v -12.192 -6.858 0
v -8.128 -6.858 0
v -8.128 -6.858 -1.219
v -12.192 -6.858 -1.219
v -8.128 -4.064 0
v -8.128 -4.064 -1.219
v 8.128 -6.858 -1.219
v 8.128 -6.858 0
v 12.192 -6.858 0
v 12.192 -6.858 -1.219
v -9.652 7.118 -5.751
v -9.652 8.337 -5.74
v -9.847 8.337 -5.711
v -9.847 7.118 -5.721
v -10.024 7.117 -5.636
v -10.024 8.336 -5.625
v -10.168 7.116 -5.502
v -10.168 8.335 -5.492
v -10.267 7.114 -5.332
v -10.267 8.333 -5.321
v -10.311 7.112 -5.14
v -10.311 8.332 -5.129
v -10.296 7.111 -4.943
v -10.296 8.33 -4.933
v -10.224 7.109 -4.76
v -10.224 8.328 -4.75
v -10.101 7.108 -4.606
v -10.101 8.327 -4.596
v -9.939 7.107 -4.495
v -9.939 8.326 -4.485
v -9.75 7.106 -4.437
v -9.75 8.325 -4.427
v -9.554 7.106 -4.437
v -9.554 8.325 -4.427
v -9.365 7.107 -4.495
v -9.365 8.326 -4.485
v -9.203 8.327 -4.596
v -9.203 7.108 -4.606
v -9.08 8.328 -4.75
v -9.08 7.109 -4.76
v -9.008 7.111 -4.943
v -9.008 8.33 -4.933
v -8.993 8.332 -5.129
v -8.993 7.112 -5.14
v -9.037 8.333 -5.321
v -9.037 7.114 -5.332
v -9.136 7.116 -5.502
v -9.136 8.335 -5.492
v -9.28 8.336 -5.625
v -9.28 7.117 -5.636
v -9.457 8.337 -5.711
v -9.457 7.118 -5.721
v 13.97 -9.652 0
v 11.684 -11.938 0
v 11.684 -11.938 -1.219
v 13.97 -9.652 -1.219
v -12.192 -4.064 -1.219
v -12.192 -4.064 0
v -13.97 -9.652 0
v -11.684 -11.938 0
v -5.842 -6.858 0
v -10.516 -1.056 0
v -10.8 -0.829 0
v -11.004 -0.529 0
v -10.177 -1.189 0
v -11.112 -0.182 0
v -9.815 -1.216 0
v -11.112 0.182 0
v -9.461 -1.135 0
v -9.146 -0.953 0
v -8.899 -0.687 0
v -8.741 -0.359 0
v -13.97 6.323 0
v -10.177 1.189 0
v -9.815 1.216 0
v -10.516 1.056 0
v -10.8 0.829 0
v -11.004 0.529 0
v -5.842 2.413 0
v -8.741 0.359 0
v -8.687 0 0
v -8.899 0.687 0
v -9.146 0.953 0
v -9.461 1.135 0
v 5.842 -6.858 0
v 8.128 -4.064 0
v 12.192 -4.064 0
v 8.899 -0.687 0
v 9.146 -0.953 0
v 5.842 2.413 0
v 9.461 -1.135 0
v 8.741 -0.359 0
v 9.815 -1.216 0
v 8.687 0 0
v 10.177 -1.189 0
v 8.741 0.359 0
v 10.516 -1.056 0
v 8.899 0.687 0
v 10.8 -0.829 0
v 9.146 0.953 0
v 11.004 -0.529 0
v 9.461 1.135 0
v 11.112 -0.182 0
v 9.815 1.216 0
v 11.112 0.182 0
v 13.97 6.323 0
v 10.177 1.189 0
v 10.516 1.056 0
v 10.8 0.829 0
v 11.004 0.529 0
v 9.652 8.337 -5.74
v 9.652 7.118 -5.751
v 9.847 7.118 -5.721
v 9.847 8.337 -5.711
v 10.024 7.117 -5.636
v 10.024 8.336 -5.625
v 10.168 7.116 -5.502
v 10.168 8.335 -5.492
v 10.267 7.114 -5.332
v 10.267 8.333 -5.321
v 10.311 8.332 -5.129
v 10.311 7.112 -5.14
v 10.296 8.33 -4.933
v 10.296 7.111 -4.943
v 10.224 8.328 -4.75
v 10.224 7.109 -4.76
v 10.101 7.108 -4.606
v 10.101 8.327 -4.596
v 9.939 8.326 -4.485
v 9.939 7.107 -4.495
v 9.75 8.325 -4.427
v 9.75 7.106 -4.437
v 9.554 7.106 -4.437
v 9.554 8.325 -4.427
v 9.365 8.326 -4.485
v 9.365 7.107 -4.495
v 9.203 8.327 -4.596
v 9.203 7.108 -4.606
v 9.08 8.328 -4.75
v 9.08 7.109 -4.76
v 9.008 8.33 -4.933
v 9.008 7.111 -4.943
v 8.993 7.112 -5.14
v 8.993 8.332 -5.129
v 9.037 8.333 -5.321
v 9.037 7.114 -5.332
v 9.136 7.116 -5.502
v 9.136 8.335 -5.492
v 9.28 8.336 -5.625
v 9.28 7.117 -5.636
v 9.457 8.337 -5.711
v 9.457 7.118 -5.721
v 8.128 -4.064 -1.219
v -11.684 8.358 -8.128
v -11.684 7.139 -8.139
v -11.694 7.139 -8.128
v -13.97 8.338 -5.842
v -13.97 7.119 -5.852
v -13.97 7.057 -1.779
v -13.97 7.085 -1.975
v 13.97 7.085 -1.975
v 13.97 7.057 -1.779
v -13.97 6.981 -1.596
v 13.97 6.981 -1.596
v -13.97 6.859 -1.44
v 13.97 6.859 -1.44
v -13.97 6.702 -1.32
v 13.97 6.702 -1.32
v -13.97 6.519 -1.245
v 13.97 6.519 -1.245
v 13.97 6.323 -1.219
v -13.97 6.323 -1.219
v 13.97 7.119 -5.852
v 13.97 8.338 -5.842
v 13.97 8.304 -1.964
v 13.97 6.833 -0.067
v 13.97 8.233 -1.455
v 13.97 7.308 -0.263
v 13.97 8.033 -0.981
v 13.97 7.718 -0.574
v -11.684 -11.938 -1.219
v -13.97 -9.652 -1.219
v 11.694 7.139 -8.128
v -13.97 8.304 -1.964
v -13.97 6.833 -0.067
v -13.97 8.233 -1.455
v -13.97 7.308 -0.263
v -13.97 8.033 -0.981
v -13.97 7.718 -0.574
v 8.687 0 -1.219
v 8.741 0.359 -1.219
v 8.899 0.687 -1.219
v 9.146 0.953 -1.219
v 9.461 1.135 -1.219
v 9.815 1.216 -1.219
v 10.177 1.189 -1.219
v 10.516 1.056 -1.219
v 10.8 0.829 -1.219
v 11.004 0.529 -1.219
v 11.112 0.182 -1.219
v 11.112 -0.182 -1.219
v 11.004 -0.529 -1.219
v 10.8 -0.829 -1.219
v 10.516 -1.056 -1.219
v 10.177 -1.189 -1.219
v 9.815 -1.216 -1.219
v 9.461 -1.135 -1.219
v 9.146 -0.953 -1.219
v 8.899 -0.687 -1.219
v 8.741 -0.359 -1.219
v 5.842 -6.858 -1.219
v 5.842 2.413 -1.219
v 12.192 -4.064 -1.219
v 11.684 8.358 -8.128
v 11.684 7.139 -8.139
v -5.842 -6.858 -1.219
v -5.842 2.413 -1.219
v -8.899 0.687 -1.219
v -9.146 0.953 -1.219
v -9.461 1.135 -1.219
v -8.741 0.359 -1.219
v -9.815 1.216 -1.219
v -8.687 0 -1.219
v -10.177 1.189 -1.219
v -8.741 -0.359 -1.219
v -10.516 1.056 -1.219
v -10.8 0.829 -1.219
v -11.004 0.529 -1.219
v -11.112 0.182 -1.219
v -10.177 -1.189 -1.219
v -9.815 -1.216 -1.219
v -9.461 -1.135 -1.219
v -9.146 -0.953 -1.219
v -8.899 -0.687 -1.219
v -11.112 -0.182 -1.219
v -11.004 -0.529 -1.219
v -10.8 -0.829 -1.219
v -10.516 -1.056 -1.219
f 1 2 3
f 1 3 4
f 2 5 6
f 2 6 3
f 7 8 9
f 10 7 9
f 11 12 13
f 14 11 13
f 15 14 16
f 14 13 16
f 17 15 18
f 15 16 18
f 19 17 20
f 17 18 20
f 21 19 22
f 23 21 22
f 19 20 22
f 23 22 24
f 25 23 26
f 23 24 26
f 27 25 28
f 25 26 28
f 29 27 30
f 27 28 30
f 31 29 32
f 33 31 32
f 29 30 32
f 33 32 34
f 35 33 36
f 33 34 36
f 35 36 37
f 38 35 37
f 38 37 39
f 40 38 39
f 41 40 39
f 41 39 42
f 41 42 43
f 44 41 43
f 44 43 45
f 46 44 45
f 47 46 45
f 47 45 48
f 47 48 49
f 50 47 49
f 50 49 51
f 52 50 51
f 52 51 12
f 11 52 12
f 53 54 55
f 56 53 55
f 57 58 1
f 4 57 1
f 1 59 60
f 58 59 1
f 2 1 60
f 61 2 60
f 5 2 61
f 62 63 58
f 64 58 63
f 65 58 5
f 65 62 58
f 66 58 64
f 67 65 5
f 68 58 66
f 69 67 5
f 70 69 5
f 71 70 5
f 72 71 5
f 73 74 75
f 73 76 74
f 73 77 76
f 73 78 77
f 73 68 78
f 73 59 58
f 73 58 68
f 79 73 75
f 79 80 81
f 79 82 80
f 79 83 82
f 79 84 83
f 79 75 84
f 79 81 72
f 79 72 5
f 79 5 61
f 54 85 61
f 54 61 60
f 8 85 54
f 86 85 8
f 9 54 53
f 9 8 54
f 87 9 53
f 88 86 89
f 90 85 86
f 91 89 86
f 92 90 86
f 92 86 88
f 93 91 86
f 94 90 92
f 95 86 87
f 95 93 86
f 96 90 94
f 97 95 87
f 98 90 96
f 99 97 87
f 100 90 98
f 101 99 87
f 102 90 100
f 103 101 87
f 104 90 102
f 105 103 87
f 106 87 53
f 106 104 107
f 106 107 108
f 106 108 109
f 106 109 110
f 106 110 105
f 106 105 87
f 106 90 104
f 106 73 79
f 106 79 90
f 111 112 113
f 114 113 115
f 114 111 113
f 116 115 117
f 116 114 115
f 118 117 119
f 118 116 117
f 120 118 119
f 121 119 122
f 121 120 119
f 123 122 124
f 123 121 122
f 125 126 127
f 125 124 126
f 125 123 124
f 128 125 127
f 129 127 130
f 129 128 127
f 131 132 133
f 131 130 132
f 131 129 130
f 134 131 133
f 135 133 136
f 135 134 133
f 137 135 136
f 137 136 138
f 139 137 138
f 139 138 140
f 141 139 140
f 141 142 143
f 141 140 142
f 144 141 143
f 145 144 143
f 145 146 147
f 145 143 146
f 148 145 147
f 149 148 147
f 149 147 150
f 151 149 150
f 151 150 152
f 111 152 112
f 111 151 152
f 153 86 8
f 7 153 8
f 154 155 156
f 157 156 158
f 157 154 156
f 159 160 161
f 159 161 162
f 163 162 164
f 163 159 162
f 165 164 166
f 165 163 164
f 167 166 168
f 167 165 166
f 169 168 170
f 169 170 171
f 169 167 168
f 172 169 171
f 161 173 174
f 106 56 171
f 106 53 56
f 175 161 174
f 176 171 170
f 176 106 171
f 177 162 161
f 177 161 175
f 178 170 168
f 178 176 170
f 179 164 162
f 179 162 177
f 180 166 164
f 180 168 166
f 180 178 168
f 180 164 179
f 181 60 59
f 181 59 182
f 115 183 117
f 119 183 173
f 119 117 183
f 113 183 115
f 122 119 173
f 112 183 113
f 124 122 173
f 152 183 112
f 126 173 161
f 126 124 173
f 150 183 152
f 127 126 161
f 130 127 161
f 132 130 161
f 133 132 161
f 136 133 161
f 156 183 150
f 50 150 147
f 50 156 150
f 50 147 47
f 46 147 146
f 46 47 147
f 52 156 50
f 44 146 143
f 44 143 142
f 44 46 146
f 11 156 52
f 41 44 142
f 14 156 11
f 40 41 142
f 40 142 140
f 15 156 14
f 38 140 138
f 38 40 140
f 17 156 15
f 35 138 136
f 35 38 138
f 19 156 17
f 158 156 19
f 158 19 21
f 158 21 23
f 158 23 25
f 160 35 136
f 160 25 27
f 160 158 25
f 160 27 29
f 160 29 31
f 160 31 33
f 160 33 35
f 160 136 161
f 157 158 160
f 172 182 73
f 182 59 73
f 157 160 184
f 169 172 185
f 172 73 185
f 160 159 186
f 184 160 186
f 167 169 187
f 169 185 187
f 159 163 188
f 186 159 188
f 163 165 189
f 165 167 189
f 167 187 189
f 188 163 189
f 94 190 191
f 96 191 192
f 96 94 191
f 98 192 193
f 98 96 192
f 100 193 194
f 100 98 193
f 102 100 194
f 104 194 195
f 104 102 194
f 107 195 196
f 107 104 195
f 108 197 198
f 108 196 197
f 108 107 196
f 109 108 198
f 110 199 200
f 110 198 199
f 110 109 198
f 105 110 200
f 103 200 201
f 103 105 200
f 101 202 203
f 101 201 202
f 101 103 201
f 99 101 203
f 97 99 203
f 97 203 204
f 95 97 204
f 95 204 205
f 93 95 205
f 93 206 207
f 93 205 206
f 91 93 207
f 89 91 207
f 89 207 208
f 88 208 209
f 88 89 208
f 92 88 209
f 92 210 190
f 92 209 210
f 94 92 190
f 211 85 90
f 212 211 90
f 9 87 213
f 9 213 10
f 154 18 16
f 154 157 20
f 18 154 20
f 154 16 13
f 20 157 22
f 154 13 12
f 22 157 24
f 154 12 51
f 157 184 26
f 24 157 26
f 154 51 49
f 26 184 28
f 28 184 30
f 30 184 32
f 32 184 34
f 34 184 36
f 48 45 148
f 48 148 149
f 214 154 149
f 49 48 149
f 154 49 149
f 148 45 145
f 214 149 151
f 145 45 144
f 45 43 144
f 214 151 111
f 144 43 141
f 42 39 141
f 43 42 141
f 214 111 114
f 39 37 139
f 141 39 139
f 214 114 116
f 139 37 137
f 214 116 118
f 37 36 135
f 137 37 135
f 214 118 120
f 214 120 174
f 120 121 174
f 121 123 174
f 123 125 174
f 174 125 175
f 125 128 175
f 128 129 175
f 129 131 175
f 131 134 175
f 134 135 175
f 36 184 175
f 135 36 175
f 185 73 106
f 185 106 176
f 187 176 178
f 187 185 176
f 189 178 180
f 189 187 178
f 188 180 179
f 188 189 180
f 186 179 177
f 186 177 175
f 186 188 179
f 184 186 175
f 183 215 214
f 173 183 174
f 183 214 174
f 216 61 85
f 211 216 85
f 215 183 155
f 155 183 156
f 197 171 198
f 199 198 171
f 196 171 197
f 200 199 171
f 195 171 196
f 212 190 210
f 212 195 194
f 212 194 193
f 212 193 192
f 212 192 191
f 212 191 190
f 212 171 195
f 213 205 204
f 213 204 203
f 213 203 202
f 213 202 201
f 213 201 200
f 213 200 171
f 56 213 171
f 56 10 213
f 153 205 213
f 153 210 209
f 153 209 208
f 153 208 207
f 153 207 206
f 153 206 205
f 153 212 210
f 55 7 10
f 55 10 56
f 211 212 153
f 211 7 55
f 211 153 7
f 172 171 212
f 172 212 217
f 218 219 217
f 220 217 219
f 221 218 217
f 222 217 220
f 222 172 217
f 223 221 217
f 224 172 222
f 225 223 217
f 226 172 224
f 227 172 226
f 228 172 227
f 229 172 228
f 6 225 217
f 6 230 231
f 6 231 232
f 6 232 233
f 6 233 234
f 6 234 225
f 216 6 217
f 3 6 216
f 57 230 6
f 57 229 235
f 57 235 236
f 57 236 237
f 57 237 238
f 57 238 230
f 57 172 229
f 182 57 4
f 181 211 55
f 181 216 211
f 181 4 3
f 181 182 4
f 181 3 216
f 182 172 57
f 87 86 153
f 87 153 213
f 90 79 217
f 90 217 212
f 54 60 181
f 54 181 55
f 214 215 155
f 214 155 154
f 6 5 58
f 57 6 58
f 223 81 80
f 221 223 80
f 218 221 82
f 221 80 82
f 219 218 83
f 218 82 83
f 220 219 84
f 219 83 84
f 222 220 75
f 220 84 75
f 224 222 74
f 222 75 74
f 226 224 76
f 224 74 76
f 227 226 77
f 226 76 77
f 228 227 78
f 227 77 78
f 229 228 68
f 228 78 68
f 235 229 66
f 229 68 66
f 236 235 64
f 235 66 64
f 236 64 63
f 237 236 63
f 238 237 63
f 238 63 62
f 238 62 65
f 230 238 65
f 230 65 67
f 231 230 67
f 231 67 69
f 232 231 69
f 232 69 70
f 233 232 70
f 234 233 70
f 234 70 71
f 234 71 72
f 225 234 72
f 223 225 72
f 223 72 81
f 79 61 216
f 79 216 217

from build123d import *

# Parameters (mm, degrees)
SKETCH2_W              = 27.94
SKETCH2_H              = 20.2692
BOSS_EXTRUDE2_DEPTH    = 8.128
DRAFT1_ANGLE           = 0.5
CONVERT_SOLID1_START   = -13.97
CONVERT_SOLID1_DEPTH   = 27.94
CONVERT_SOLID1_2_DEPTH = 27.94
SKETCH26_R             = 0.6604
CUT_EXTRUDE6_DEPTH     = 27.664739949
SKETCH16_R             = 1.2192
SKETCH16_W             = 4.064
SKETCH16_H             = 2.794
CUT_EXTRUDE4_DEPTH     = 60.515150005
SKETCH35_W             = 11.684
SKETCH35_H             = 9.271
CUT_EXTRUDE7_DEPTH     = 3.81
CHAMFER1_SIZE          = 2.286


# Read off the part's stored shape, not the designer's step: Convert-Solid1
with BuildPart() as part:
    # Sketch2 → Boss-Extrude2 (new body)
    with BuildSketch(Plane.XY):
        with Locations((0, -1.8034)):
            Rectangle(SKETCH2_W, SKETCH2_H)
    extrude(amount=-BOSS_EXTRUDE2_DEPTH)

    # Draft1
    draft1_faces = [part.faces().sort_by_distance(p)[0] for p in [
        (0, 8.3312, -4.064),
    ]]
    draft(draft1_faces, Plane.XY.offset(-5.08), DRAFT1_ANGLE)

    # Convert-Solid1 outline → Convert-Solid1 (cut)
    with BuildSketch(Plane.YZ.offset(CONVERT_SOLID1_START)):
        with BuildLine():
            Line((-11.938, -8.128), (7.138553067, -8.128))
            Line((7.138553067, -8.128), (7.084852727, -1.97455038))
            ThreePointArc((7.084852727, -1.97455038), (6.859340961, -1.440038744), (6.322881741, -1.2192))
            Line((6.322881741, -1.2192), (-11.938, -1.2192))
            Line((-11.938, -1.2192), (-11.938, -8.128))
        make_face()
        with BuildLine():
            ThreePointArc((6.322881741, 0), (7.717675713, -0.574180734), (8.304006303, -1.963910988))
            Line((8.304006303, -1.963910988), (8.286867512, 0))
            Line((8.286867512, 0), (6.322881741, 0))
        make_face()
    extrude(amount=CONVERT_SOLID1_DEPTH, mode=Mode.SUBTRACT)

    # Convert-Solid1 2 outline → Convert-Solid1 2 (add)
    with BuildSketch(Plane.YZ.offset(CONVERT_SOLID1_START)):
        Polygon((7.138553067, -8.128), (7.138645916, -8.138639392), (8.357799493, -8.128), align=None)
    extrude(amount=CONVERT_SOLID1_2_DEPTH)

    # Sketch26 → Cut-Extrude6 (cut, through all)
    with BuildSketch(Plane(origin=(0, 8.375524998, -10.159141632), x_dir=(1, 0, 0), z_dir=(0, -0.9999619230641713, -0.008726535498373954))):
        with Locations(Location((9.652, 5.079528476, 0), (0, 0, 270))):
            Circle(SKETCH26_R)
        Polygon((9.887639275, 0.235167751), (15.766051224, 6.1135797), (15.766051224, 0.235167751), align=None)
    cut_extrude6 = extrude(amount=CUT_EXTRUDE6_DEPTH, mode=Mode.SUBTRACT)

    # Sketch16 → Cut-Extrude4 (cut, through all)
    with BuildSketch(Plane(origin=(0, 45.339, 0), x_dir=(1, 0, 0), z_dir=(0, 0, -1))):
        with Locations(Location((9.906, 45.339, 0), (0, 0, 180))):
            Circle(SKETCH16_R)
        with Locations((10.16, 50.8)):
            Rectangle(SKETCH16_W, SKETCH16_H)
    cut_extrude4 = extrude(amount=CUT_EXTRUDE4_DEPTH, mode=Mode.SUBTRACT)

    # Mirror1: Cut-Extrude6, Cut-Extrude4 across plane
    add(cut_extrude6.mirror(Plane(origin=(0, 0, 0), x_dir=(0, 0, 1), z_dir=(1, 0, 0))), mode=Mode.SUBTRACT)
    add(cut_extrude4.mirror(Plane(origin=(0, 0, 0), x_dir=(0, 0, 1), z_dir=(1, 0, 0))), mode=Mode.SUBTRACT)

    # Sketch35 → Cut-Extrude7 (cut)
    with BuildSketch(Plane.XY):
        with Locations((0, -2.2225)):
            Rectangle(SKETCH35_W, SKETCH35_H)
    extrude(amount=-CUT_EXTRUDE7_DEPTH, mode=Mode.SUBTRACT)

    # Chamfer1
    chamfer1_edges = [part.edges().sort_by_distance(p)[0] for p in [
        (13.97, -11.938, -0.6096),
        (-13.97, -11.938, -0.6096),
    ]]
    chamfer(chamfer1_edges, length=CHAMFER1_SIZE)


solid = part.part
